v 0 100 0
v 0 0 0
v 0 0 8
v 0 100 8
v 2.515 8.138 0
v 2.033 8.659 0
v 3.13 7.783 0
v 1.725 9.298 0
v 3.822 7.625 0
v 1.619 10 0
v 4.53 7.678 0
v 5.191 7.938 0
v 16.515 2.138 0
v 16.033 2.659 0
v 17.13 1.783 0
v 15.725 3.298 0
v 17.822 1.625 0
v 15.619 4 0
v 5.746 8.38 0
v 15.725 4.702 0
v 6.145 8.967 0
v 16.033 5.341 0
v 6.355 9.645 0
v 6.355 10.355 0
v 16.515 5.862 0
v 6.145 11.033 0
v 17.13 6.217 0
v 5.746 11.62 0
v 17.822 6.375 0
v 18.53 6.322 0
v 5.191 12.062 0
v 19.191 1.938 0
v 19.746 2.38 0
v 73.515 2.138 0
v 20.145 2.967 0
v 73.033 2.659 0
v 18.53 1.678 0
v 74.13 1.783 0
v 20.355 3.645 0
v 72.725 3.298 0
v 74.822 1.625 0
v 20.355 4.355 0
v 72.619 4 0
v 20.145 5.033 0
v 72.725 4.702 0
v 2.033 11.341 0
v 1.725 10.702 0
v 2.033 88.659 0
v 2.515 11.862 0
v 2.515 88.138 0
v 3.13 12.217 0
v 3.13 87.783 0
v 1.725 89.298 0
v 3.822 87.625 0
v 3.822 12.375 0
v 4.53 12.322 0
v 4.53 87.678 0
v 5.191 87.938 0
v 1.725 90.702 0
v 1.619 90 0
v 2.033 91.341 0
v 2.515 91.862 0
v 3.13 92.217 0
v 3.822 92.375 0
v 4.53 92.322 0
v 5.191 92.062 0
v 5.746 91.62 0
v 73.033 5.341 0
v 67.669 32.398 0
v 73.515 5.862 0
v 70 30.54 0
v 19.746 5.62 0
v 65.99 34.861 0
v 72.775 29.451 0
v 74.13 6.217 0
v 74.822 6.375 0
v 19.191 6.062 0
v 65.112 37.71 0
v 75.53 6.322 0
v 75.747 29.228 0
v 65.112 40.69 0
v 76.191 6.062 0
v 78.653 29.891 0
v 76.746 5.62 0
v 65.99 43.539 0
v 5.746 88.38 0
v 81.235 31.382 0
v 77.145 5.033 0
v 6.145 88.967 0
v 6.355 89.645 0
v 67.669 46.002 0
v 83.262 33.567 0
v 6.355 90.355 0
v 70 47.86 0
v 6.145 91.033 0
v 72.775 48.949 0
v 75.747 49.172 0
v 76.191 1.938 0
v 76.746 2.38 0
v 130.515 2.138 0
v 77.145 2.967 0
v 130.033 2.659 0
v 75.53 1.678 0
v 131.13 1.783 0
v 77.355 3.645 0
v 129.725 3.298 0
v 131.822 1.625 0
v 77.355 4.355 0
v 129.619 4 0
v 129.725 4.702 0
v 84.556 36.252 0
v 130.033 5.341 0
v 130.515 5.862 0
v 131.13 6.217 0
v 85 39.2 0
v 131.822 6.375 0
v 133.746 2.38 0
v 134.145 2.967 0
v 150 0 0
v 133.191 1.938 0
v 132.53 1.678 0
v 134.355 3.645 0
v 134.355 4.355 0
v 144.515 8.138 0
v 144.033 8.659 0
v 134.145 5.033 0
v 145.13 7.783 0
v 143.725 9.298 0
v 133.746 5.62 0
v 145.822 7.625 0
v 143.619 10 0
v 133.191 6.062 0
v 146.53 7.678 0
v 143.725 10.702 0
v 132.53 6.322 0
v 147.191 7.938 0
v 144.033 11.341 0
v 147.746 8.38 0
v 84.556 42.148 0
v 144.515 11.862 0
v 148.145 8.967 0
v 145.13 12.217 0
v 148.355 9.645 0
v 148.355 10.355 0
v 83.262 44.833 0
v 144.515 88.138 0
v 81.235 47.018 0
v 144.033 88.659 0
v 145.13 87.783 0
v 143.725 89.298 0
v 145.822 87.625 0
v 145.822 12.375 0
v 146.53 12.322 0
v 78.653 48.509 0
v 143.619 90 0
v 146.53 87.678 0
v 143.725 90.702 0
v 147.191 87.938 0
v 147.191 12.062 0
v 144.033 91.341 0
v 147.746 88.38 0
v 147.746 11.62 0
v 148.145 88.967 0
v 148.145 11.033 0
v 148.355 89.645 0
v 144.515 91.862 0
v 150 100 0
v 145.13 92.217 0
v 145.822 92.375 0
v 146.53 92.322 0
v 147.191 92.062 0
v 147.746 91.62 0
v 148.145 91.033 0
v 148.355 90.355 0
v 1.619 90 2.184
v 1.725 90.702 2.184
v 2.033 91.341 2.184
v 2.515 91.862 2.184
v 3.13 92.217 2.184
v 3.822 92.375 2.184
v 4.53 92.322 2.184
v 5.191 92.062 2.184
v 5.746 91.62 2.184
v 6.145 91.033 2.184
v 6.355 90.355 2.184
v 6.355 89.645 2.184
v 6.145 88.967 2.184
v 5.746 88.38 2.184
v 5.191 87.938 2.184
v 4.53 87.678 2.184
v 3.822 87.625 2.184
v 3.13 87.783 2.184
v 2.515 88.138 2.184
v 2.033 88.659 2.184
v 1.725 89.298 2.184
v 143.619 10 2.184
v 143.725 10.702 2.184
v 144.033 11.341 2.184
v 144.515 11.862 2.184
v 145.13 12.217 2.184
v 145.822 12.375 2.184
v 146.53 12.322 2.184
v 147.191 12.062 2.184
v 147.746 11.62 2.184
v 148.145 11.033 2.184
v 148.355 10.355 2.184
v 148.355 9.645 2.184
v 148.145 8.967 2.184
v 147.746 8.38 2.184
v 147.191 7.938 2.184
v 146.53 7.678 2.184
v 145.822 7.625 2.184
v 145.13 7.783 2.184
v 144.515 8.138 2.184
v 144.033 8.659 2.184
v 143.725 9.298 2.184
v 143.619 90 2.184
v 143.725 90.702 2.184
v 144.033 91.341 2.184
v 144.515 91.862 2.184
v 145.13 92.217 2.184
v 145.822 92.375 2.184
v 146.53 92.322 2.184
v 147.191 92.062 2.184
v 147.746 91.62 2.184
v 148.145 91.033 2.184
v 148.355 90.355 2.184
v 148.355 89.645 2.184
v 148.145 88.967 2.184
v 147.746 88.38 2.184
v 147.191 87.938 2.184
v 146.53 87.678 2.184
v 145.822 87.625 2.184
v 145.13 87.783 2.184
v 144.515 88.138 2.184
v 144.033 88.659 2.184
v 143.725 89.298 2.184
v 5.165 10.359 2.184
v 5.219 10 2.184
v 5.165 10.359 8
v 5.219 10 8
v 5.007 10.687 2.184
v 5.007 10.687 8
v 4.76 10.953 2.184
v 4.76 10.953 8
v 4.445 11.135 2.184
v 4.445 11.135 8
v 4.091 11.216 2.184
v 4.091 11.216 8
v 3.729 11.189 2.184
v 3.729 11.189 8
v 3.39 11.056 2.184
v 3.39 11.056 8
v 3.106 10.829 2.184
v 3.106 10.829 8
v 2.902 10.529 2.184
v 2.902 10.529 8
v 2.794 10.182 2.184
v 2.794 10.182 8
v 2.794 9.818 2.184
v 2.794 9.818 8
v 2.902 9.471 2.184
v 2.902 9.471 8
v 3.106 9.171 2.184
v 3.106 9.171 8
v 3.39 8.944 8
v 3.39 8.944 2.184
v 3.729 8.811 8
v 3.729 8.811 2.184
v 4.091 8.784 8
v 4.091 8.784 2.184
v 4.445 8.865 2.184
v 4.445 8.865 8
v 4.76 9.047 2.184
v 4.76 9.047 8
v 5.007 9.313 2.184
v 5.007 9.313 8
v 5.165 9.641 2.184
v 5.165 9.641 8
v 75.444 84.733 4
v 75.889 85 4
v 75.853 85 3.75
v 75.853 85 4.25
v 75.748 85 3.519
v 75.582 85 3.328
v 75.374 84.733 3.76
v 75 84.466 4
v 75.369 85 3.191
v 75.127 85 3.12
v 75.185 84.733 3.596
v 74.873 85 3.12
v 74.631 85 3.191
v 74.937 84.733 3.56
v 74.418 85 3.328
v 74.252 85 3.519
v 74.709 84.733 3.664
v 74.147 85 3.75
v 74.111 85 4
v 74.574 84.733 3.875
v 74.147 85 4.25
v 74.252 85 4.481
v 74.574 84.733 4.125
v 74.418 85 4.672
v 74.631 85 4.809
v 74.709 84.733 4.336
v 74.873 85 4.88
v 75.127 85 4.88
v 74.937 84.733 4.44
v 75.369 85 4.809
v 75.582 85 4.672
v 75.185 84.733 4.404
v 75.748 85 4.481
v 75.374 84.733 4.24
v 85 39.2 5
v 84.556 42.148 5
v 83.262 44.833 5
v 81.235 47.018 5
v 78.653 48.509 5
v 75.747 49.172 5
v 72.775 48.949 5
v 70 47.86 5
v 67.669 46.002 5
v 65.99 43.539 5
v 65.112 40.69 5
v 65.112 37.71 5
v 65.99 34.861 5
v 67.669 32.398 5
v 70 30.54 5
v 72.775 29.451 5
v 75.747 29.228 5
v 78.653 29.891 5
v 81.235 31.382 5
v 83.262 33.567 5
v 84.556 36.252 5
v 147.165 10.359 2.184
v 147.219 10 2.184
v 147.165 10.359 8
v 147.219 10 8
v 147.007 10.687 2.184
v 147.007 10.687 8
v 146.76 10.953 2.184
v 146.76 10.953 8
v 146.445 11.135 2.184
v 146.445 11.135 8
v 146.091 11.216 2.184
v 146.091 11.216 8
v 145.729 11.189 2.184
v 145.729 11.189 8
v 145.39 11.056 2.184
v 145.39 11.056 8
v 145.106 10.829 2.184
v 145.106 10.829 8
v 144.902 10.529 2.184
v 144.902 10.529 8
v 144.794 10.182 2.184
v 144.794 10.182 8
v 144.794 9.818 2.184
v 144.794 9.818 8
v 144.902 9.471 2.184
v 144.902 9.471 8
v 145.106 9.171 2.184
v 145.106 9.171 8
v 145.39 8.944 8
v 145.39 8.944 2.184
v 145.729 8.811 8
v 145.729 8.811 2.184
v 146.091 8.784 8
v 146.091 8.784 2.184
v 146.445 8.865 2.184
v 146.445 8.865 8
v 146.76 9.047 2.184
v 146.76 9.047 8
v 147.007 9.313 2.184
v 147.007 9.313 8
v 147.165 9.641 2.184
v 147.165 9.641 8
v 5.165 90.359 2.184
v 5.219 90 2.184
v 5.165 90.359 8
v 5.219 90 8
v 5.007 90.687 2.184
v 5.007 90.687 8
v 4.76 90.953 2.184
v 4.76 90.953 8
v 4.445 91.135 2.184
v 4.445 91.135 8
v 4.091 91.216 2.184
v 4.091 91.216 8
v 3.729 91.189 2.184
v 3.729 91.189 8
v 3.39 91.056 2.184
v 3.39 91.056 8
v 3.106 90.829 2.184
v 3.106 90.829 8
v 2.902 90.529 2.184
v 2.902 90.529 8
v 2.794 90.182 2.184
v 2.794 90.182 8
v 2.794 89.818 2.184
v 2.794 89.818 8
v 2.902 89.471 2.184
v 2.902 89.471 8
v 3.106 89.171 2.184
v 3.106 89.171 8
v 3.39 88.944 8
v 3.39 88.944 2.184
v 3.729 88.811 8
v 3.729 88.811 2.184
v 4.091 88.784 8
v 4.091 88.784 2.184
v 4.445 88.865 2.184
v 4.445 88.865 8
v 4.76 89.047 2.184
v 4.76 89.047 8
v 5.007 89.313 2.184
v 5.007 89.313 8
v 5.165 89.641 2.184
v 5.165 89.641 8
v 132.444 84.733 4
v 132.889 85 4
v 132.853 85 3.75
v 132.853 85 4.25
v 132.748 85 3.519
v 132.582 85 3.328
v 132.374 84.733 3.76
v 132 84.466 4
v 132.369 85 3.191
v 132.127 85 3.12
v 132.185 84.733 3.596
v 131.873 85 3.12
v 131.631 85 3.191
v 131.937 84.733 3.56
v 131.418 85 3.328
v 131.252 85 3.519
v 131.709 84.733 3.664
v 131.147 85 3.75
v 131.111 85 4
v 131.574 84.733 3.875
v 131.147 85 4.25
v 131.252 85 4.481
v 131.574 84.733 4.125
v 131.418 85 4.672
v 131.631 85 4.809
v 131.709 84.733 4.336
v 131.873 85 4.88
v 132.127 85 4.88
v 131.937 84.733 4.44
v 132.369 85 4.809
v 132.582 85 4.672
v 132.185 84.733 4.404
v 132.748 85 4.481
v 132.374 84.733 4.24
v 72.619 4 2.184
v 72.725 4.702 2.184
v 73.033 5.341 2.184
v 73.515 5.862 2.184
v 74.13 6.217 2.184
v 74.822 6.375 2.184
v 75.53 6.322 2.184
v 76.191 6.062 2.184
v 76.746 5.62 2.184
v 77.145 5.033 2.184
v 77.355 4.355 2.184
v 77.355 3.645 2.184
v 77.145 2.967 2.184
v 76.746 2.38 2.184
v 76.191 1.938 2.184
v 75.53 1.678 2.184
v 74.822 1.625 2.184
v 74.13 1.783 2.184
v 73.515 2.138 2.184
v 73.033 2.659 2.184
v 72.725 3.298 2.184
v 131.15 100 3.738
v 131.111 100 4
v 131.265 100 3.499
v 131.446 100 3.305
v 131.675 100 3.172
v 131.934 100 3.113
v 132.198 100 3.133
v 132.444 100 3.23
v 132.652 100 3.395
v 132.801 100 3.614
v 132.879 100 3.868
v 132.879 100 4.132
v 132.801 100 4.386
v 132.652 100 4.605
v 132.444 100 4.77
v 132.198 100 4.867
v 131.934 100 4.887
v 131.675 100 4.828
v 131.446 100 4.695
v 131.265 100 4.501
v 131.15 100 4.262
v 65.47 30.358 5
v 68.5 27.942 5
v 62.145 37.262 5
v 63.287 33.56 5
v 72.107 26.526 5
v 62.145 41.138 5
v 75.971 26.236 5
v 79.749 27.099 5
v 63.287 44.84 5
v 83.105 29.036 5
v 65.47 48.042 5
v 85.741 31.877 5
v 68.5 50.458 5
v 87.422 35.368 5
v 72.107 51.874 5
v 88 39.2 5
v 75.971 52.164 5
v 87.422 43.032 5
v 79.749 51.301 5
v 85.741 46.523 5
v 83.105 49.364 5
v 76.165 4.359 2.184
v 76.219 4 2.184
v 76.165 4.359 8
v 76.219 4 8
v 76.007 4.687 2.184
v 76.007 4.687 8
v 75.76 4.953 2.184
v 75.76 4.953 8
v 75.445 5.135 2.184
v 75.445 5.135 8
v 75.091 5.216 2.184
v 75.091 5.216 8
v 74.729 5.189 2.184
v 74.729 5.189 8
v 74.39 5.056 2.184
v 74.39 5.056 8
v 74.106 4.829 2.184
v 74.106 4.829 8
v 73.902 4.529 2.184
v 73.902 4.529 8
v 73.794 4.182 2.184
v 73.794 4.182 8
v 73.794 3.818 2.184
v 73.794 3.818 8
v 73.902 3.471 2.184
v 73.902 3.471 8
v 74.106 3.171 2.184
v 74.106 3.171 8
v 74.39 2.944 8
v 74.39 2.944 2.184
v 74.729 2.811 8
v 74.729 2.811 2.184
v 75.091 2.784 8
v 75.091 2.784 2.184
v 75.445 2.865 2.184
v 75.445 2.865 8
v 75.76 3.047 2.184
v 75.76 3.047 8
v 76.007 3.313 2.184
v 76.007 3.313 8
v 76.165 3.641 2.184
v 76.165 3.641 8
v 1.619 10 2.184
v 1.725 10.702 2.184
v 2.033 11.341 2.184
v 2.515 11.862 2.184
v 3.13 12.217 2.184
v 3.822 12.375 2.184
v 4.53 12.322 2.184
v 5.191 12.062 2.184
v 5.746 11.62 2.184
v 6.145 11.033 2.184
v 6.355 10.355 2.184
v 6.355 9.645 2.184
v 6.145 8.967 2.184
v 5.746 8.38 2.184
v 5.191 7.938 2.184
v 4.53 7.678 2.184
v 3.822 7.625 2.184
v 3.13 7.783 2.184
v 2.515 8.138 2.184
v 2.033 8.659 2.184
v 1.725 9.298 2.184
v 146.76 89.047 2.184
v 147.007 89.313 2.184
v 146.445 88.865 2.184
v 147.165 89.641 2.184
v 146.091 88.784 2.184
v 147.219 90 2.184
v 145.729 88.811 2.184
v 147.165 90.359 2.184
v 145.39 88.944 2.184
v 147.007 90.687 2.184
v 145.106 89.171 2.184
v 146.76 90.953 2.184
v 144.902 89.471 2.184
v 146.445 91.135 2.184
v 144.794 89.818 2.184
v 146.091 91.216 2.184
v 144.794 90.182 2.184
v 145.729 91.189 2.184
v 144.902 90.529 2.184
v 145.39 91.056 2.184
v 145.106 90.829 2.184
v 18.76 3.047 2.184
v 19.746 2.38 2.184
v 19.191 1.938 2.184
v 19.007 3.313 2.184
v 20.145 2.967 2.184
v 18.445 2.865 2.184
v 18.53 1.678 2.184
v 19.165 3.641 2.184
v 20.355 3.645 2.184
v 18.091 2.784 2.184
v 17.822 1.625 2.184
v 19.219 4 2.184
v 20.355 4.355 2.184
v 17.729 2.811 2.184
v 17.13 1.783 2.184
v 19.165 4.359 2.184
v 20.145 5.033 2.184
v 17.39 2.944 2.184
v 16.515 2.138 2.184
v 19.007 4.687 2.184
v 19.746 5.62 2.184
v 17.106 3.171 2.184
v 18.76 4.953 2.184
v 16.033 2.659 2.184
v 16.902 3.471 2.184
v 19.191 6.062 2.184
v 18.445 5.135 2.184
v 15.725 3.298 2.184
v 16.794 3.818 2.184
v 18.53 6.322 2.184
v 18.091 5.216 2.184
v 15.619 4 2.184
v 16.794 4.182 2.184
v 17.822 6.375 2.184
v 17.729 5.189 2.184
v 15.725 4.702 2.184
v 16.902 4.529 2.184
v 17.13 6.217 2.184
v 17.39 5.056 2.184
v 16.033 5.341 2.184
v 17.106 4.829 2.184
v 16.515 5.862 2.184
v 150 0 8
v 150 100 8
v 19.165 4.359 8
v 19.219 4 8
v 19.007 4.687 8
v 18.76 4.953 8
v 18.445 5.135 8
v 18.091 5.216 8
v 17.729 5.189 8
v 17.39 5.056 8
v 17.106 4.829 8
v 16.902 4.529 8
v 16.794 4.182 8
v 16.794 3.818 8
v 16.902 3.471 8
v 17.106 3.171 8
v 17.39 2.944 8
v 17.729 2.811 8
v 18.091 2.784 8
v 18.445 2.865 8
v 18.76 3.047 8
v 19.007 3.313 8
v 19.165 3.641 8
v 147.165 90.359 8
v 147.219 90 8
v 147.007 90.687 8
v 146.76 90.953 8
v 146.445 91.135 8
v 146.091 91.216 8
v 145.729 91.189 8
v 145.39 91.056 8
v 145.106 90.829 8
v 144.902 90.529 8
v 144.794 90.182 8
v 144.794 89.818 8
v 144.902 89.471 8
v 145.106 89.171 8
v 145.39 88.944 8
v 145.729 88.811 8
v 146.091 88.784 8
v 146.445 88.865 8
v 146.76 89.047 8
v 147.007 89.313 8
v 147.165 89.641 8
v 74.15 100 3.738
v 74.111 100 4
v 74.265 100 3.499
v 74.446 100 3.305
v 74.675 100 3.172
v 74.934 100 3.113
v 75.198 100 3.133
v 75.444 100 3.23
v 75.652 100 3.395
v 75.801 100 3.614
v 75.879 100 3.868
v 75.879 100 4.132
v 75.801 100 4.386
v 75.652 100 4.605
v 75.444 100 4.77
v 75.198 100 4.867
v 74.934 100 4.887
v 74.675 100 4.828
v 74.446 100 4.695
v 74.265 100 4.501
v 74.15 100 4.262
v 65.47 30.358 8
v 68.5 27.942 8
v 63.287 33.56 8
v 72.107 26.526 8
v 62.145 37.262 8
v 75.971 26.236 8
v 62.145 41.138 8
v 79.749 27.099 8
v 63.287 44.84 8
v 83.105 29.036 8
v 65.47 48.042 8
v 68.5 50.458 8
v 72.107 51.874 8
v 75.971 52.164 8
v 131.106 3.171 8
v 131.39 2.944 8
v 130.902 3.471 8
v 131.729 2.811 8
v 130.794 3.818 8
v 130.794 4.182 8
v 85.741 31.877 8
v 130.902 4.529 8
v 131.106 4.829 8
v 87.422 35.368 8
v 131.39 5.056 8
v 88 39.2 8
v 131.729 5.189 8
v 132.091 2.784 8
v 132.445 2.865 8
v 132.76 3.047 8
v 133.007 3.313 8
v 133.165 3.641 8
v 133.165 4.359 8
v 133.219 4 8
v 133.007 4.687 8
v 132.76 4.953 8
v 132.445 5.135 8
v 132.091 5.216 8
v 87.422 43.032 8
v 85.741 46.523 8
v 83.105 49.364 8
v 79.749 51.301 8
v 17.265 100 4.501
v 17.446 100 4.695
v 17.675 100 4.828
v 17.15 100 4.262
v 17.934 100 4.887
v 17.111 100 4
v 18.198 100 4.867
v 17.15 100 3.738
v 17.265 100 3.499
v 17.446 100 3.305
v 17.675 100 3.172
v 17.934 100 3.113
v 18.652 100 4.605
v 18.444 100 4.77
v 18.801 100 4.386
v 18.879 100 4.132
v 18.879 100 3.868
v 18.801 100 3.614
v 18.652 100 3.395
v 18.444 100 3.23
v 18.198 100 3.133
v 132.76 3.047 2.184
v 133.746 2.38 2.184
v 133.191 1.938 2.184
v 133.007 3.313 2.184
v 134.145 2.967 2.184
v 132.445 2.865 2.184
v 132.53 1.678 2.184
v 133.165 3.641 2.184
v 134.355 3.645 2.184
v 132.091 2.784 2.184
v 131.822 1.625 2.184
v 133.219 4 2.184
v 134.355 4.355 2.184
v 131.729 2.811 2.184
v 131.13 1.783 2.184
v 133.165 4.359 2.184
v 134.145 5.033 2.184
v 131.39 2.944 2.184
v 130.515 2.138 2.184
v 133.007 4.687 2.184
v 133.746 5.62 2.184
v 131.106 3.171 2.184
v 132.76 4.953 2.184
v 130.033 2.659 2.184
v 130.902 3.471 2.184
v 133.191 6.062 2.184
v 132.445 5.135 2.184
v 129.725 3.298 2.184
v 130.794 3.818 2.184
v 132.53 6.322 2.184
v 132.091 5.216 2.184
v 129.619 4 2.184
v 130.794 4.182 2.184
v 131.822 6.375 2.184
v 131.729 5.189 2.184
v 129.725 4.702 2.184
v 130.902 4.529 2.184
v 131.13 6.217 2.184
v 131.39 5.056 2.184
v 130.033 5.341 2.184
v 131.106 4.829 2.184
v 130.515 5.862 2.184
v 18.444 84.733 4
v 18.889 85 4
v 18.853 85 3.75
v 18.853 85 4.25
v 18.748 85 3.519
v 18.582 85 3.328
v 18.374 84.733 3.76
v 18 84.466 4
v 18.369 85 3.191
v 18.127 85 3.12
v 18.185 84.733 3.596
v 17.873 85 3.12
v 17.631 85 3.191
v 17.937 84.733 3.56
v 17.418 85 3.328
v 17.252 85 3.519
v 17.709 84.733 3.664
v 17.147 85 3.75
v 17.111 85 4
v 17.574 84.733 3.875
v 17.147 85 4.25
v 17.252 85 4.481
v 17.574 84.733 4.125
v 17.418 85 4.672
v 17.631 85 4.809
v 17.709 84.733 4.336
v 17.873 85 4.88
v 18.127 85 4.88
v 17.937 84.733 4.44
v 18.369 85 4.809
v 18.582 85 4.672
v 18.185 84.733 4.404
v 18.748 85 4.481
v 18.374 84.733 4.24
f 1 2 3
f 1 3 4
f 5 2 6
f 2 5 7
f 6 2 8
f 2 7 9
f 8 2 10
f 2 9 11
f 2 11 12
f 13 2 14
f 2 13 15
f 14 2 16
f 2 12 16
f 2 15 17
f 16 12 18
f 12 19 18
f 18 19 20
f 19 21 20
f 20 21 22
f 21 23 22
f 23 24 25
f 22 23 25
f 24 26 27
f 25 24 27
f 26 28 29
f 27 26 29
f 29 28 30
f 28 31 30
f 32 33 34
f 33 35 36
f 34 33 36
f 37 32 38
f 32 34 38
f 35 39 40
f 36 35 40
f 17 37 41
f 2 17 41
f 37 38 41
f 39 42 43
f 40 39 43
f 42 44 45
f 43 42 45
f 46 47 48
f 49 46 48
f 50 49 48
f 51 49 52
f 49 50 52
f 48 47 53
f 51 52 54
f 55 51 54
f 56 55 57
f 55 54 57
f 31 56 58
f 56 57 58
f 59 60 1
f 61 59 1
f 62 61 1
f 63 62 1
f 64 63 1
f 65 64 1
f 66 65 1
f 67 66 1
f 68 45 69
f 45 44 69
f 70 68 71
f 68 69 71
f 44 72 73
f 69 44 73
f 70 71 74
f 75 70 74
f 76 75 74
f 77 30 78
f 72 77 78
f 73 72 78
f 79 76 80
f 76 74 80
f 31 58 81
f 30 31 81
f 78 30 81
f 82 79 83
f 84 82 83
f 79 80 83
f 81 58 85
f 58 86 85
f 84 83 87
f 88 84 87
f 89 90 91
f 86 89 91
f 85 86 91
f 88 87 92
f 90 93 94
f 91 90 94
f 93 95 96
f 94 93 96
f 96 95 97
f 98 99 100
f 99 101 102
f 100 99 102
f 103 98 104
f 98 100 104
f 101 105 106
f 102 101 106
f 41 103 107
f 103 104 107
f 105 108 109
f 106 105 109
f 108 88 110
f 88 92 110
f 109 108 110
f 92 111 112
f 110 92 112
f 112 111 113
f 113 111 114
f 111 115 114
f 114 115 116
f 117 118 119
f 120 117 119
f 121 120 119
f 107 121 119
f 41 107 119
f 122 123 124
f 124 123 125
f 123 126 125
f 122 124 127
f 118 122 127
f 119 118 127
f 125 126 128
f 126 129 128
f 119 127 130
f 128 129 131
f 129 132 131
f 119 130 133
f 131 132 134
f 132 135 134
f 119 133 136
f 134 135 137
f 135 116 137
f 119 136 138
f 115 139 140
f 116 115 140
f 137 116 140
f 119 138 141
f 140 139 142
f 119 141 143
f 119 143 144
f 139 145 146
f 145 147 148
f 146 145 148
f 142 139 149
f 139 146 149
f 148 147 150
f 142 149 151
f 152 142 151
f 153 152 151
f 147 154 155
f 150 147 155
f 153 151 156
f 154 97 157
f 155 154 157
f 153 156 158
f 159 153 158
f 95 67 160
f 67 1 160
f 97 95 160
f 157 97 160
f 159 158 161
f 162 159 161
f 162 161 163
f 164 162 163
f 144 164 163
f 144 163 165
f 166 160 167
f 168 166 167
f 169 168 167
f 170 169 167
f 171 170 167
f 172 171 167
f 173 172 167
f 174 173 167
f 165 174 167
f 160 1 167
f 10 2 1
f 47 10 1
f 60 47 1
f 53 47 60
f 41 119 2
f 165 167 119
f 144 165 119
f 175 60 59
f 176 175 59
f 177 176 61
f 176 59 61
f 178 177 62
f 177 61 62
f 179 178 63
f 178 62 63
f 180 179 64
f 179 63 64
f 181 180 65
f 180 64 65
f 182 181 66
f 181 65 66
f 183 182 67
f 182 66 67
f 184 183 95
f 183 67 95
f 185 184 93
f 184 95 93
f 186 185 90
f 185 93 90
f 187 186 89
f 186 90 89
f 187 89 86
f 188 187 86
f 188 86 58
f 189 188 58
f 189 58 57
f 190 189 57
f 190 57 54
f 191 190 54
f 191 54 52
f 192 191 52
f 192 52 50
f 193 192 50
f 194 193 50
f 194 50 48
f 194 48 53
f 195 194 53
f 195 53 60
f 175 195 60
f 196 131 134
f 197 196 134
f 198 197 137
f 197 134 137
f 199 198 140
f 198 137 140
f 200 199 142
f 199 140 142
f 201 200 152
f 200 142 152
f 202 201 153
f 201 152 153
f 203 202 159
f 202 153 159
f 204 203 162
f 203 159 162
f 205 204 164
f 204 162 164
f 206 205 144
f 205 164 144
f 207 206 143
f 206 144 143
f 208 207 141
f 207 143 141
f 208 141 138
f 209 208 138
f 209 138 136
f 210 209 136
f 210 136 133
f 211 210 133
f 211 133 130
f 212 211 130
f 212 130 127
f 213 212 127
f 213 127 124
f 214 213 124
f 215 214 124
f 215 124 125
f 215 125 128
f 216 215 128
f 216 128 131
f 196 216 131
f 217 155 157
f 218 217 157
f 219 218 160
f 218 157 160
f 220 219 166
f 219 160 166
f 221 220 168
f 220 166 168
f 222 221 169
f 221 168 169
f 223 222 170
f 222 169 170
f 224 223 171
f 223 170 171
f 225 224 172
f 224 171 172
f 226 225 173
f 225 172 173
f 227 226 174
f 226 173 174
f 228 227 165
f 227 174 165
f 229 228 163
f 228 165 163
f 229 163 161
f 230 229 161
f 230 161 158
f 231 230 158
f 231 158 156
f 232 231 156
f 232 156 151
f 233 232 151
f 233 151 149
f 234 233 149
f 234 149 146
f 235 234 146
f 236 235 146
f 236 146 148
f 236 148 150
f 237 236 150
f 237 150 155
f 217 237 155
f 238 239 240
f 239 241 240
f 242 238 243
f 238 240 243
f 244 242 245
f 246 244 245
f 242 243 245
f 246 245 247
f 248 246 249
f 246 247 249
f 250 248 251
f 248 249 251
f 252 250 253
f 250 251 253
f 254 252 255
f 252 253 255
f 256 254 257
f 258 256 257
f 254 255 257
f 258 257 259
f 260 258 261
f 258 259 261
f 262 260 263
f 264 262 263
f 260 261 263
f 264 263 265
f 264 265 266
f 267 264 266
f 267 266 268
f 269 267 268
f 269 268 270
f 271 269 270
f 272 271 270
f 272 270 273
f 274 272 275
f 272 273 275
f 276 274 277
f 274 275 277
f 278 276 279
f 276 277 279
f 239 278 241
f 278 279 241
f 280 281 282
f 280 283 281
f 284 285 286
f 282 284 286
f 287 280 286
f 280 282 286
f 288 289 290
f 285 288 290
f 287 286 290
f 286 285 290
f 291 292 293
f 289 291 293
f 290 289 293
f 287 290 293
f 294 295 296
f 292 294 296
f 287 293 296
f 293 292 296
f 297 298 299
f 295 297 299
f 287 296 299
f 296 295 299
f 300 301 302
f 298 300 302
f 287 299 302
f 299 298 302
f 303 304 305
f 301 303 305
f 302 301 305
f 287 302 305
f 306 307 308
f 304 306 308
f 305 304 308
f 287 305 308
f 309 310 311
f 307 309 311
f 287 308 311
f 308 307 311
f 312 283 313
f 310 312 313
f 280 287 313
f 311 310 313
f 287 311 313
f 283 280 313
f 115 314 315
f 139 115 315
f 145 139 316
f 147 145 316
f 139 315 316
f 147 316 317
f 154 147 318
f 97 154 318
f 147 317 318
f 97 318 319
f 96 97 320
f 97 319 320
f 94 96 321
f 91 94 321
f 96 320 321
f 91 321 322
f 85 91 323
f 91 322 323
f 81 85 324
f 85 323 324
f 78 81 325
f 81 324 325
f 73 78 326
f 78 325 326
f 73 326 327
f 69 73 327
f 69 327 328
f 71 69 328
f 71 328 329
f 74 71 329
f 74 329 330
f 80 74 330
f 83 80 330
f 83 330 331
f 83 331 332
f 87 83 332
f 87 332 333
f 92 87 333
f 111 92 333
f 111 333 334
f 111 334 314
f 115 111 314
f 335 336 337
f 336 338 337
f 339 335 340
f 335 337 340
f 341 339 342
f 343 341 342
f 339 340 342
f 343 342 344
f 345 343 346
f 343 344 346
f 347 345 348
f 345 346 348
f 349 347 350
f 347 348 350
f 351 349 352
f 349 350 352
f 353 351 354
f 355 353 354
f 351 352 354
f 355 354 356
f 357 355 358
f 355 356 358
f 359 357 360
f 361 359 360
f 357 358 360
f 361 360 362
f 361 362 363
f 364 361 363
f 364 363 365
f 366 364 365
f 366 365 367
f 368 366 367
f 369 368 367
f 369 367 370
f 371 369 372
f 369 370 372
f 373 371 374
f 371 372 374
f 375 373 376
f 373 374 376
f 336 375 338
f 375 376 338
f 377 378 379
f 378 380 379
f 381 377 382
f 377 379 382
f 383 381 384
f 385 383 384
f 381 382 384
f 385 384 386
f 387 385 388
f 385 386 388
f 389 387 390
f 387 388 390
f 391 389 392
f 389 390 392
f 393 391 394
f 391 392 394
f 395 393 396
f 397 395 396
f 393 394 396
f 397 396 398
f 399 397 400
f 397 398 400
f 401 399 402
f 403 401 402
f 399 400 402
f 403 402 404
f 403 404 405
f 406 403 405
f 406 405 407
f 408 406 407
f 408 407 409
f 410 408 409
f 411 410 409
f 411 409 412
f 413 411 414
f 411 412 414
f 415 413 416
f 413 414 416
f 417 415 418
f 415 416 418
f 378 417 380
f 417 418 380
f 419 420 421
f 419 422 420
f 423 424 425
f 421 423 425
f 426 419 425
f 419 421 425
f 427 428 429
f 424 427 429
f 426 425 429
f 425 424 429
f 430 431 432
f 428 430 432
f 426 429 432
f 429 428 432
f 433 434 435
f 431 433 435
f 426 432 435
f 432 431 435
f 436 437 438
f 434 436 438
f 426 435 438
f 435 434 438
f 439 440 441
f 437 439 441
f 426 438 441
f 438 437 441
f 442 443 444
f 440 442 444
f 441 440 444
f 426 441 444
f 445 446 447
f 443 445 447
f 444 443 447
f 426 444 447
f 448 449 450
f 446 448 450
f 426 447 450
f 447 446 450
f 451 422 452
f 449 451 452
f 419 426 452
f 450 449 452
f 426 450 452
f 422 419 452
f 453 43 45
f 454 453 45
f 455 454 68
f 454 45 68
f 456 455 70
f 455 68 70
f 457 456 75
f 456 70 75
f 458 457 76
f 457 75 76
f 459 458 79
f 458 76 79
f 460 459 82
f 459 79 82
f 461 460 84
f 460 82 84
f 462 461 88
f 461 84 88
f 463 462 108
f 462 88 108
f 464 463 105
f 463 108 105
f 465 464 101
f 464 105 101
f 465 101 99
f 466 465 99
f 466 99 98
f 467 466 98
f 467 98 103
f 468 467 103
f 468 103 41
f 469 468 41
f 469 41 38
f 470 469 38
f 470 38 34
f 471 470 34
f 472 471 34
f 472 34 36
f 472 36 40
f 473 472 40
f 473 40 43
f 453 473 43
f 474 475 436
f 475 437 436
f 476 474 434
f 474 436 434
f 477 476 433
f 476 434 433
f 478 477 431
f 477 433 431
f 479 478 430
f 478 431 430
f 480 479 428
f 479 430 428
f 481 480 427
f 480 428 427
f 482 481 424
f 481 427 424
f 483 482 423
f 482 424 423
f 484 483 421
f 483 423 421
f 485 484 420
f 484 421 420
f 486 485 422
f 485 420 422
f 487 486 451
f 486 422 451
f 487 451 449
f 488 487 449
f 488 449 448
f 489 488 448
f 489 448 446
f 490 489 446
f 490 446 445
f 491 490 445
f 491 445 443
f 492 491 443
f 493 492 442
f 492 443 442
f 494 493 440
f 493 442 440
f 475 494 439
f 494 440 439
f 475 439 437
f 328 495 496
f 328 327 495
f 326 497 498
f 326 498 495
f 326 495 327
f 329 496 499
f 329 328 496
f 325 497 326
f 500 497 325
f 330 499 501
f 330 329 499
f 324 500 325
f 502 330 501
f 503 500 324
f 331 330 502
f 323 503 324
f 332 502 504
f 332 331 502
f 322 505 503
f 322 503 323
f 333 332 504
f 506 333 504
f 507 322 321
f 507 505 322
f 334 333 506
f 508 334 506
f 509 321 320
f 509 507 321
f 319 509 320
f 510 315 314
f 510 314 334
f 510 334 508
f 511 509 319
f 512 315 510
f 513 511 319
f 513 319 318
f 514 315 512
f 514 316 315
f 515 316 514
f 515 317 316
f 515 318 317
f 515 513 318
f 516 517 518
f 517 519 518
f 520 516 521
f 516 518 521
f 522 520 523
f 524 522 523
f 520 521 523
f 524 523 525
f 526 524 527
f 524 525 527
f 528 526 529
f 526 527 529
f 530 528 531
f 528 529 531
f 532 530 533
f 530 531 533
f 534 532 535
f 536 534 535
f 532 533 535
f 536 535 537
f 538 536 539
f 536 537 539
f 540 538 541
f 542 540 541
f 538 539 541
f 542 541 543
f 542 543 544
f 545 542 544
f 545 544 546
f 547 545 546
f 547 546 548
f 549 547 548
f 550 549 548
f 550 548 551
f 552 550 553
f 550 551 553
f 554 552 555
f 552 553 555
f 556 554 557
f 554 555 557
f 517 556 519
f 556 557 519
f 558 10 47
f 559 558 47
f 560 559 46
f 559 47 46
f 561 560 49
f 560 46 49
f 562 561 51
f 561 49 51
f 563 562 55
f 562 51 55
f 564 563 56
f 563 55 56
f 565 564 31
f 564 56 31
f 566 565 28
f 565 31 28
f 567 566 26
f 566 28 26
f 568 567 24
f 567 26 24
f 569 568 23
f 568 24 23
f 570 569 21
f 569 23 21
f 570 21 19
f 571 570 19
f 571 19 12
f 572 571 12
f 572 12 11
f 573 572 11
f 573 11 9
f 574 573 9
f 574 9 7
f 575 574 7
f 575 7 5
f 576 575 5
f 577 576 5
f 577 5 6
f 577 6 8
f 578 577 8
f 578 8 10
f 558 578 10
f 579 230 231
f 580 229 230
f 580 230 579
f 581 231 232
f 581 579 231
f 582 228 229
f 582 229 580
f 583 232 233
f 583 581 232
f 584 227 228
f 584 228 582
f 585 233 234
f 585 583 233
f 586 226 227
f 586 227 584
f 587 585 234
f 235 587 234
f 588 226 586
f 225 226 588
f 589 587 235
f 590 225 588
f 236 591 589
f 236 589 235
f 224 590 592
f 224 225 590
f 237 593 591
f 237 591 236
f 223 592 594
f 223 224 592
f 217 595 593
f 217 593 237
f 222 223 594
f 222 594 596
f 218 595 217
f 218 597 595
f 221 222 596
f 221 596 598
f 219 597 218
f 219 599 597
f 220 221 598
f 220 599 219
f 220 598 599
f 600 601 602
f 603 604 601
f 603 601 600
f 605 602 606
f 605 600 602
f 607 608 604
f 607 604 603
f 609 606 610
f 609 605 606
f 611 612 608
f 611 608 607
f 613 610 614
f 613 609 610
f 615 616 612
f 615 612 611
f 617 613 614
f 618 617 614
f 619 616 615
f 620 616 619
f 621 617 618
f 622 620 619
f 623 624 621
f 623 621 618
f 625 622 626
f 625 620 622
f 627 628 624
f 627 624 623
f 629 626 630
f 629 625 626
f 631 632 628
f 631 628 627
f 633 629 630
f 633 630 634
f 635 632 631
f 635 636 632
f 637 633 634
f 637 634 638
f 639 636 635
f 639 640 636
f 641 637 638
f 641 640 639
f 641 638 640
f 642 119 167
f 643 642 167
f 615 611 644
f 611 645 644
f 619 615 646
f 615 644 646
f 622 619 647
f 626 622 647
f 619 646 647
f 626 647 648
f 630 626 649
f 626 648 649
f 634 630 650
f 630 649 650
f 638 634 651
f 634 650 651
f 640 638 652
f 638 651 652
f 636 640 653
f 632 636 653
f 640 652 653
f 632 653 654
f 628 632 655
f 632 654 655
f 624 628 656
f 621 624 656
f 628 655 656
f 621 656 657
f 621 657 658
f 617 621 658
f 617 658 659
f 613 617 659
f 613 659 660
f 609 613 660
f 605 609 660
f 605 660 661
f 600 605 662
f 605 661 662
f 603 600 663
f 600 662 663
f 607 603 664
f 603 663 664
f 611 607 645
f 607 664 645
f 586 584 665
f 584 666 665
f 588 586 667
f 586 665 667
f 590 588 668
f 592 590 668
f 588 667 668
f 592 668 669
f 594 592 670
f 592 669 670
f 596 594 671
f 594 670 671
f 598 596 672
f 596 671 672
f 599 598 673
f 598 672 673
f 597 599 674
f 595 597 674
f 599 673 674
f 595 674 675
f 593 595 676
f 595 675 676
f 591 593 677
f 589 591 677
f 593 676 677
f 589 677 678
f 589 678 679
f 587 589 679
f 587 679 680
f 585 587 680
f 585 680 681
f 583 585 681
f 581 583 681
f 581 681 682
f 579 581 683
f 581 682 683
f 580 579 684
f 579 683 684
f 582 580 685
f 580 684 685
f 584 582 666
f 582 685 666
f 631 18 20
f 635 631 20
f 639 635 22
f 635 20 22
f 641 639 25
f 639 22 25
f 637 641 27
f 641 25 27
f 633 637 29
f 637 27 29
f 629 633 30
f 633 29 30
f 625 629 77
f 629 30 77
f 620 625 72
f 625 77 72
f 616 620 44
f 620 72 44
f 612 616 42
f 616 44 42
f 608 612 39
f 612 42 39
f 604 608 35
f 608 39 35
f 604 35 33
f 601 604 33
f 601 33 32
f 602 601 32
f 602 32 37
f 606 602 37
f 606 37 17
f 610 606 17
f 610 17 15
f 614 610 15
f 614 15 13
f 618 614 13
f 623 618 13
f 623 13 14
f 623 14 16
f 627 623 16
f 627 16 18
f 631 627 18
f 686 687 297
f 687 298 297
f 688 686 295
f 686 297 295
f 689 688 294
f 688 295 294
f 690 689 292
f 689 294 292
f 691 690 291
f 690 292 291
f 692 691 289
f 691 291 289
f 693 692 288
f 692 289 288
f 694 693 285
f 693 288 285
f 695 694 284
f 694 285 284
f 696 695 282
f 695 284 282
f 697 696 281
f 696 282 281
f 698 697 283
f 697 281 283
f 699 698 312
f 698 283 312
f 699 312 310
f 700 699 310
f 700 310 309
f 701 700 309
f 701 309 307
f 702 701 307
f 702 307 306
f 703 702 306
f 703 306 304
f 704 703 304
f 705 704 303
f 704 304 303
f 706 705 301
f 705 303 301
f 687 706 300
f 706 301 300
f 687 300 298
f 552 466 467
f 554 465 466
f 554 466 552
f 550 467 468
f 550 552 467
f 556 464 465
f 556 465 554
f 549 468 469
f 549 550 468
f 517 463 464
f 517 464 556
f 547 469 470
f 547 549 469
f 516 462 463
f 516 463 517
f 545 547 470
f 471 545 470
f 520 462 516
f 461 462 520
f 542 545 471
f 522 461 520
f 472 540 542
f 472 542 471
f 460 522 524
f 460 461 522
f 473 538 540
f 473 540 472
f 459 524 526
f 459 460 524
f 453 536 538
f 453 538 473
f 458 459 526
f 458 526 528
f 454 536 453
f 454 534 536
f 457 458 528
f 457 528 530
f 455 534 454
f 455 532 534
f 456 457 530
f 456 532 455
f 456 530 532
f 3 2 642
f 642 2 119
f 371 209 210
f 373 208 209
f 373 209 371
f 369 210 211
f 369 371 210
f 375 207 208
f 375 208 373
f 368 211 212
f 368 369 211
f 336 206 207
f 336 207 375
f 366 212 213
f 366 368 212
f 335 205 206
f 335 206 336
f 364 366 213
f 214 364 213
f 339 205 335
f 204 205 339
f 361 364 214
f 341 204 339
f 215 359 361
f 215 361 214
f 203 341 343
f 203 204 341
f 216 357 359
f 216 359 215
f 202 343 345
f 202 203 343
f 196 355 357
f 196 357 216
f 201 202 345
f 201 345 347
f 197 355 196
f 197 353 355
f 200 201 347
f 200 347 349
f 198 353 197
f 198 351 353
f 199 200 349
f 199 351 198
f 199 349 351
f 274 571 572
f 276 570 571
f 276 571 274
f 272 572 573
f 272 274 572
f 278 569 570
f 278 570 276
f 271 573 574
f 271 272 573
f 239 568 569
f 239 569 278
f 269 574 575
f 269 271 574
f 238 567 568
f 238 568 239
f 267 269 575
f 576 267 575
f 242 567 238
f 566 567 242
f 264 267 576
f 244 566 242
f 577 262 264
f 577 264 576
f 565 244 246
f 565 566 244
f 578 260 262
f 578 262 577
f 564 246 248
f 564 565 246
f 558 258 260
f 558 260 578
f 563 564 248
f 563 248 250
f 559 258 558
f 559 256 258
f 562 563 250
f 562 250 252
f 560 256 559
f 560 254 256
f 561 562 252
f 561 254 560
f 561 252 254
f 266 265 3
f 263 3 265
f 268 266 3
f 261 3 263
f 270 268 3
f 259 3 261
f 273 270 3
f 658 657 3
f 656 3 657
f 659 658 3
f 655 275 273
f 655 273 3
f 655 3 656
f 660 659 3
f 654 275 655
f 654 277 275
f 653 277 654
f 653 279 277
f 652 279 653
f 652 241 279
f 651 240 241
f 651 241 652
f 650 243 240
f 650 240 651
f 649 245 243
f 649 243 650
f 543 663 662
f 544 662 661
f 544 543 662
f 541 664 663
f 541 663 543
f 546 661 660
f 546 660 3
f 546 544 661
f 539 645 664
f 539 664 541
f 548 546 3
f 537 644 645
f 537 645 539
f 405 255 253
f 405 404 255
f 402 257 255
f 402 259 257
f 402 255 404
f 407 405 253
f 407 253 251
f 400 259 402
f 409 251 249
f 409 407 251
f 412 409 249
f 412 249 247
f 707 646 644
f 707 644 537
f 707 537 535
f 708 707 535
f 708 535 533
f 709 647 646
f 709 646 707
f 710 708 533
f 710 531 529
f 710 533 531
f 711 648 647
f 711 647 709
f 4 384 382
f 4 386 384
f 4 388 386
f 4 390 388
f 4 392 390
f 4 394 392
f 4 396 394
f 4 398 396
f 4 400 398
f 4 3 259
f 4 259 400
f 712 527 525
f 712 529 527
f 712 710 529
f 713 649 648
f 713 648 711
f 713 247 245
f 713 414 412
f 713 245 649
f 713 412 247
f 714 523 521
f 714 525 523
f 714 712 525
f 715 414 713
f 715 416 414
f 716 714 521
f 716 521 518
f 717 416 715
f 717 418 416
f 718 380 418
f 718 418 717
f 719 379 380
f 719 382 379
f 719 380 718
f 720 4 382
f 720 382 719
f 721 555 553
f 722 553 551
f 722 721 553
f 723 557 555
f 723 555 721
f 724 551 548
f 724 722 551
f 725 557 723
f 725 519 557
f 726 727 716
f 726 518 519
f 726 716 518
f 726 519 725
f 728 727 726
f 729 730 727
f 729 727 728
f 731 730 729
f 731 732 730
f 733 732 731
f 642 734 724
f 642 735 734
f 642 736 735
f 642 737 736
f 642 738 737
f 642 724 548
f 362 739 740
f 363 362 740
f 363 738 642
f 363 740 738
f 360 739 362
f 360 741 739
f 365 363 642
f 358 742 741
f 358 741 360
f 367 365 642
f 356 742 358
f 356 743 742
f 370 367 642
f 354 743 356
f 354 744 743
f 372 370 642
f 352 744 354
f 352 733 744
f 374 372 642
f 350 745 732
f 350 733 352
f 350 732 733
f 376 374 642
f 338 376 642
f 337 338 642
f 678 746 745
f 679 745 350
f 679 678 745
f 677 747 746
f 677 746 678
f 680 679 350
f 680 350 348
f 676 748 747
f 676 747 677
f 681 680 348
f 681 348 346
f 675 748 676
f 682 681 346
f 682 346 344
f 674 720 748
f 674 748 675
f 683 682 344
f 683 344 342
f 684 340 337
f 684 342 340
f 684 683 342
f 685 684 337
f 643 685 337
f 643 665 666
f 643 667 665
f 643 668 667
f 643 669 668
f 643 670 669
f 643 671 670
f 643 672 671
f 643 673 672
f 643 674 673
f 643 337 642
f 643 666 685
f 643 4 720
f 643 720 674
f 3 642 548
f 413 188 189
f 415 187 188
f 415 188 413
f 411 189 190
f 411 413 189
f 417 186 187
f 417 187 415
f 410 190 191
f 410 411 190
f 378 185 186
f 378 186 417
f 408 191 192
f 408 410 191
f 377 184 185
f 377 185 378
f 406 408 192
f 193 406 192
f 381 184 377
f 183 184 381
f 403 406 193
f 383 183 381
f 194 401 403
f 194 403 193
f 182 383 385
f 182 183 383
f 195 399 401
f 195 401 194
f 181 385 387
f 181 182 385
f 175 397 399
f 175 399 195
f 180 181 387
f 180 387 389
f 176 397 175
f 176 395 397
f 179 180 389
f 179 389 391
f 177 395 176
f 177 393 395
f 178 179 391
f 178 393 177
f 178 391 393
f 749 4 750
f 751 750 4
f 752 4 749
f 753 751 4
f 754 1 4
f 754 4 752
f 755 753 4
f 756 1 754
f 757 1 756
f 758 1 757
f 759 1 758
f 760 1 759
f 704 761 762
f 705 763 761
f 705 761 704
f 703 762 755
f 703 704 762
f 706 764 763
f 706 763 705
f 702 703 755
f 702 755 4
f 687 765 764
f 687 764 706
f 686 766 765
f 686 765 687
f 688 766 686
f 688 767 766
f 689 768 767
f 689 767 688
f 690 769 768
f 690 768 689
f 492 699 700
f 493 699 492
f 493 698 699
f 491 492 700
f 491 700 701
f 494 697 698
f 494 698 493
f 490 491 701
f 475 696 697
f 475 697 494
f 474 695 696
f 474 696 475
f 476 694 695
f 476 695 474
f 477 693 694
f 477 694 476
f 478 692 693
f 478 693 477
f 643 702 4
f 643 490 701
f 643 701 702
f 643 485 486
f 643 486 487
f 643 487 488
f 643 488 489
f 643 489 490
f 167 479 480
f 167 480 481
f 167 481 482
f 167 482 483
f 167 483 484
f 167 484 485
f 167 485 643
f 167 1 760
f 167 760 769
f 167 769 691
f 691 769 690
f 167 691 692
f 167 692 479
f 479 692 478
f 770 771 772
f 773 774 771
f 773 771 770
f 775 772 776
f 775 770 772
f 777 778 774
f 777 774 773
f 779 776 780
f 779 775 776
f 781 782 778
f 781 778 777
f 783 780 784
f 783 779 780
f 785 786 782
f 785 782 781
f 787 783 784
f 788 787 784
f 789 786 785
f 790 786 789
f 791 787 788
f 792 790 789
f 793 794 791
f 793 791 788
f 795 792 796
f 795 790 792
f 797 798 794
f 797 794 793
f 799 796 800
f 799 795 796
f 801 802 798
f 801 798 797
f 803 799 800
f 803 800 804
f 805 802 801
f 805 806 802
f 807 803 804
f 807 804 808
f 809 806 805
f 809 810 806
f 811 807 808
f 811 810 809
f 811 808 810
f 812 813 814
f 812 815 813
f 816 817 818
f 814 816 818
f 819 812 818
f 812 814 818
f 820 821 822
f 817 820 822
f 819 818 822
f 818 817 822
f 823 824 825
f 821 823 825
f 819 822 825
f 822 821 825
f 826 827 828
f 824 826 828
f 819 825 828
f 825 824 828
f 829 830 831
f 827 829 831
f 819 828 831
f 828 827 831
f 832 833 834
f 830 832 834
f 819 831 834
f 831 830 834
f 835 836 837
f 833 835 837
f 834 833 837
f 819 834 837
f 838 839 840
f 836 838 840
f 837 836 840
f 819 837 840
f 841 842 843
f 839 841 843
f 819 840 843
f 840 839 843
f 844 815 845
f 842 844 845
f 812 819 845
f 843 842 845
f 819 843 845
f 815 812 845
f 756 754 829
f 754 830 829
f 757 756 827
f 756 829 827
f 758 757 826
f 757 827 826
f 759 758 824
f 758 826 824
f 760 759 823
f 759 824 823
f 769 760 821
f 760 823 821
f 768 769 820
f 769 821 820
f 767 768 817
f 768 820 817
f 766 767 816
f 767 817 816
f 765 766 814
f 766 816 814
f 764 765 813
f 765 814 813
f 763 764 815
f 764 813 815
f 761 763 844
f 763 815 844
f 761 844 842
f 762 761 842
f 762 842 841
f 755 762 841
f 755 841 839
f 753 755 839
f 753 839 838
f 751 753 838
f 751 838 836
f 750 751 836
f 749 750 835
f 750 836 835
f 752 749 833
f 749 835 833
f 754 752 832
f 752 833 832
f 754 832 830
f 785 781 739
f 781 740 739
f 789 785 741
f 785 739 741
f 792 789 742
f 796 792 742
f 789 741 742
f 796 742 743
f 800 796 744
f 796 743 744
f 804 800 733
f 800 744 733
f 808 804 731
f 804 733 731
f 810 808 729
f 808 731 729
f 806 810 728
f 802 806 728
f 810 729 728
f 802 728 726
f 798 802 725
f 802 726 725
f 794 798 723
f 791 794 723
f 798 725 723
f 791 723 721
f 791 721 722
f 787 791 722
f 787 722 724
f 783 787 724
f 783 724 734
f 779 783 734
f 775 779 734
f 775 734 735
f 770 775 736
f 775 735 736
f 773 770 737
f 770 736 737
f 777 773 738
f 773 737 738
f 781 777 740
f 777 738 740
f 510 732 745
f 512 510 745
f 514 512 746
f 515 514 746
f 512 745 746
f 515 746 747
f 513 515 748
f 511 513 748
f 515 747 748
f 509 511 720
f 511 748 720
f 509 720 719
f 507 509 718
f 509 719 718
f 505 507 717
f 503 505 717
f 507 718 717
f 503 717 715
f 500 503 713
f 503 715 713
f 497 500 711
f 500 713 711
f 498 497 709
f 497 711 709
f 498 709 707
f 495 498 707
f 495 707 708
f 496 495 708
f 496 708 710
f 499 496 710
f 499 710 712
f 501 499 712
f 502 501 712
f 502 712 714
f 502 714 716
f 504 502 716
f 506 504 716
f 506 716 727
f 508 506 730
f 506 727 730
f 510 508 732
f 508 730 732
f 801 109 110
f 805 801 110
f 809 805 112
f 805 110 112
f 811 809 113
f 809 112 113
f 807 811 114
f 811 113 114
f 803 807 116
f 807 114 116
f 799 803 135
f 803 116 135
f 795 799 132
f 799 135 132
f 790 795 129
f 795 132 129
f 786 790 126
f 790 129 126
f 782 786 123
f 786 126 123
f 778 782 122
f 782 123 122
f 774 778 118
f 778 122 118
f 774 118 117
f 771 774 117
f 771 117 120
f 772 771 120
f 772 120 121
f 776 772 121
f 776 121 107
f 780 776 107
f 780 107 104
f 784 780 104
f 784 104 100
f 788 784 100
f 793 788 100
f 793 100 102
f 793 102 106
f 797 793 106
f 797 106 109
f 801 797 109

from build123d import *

# Parameters (mm, degrees)
SKETCH1_W                                      = 150
SKETCH1_H                                      = 100
BOSS_EXTRUDE1_DEPTH                            = 8
CBORE_FOR_2_SOCKET_HEAD_CAP_SCREW1_D           = 2.4384
CBORE_FOR_2_SOCKET_HEAD_CAP_SCREW1_CBORE_D     = 4.7625
CBORE_FOR_2_SOCKET_HEAD_CAP_SCREW1_CBORE_DEPTH = 2.1844
SKETCH5_R                                      = 10
CUT_EXTRUDE1_DEPTH                             = 9
SKETCH6_R                                      = 13
CUT_EXTRUDE2_DEPTH                             = 3
F_2_56_TAPPED_HOLE1_D                          = 1.778
F_2_56_TAPPED_HOLE1_DEPTH                      = 15
F_2_56_TAPPED_HOLE1_TIP                        = 0.53416509


with BuildPart() as part:
    # Sketch1 → Boss-Extrude1 (new body)
    with BuildSketch(Plane.XY):
        with Locations((75, 50)):
            Rectangle(SKETCH1_W, SKETCH1_H)
    extrude(amount=BOSS_EXTRUDE1_DEPTH)

    # CBORE for #2 Socket Head Cap Screw1 (through all)
    with Locations(Plane(origin=(0, 0, 0), x_dir=(-1, 0, 0), z_dir=(0, 0, -1))):
        with Locations((-132, 4), (-18, 4), (-4, 90), (-146, 90), (-146, 10), (-4, 10), (-75, 4)):
            CounterBoreHole(CBORE_FOR_2_SOCKET_HEAD_CAP_SCREW1_D / 2, CBORE_FOR_2_SOCKET_HEAD_CAP_SCREW1_CBORE_D / 2, CBORE_FOR_2_SOCKET_HEAD_CAP_SCREW1_CBORE_DEPTH)

    # Sketch5 → Cut-Extrude1 (cut, through all)
    with BuildSketch(Plane.XY.offset(8)):
        with Locations((75, 39.2)):
            Circle(SKETCH5_R)
    extrude(amount=-CUT_EXTRUDE1_DEPTH, mode=Mode.SUBTRACT)

    # Sketch6 → Cut-Extrude2 (cut)
    with BuildSketch(Plane.XY.offset(8)):
        with Locations((75, 39.2)):
            Circle(SKETCH6_R)
    extrude(amount=-CUT_EXTRUDE2_DEPTH, mode=Mode.SUBTRACT)

    # #2-56 Tapped Hole1
    with Locations(Plane(origin=(0, 100, 0), x_dir=(1, 0, 0), z_dir=(0, 1, 0))):
        with Locations((18, -4), (75, -4), (132, -4)):
            Hole(F_2_56_TAPPED_HOLE1_D / 2, depth=F_2_56_TAPPED_HOLE1_DEPTH)
            with Locations((0, 0, -(F_2_56_TAPPED_HOLE1_DEPTH + F_2_56_TAPPED_HOLE1_TIP / 2))):  # 118° drill point
                Cone(0, F_2_56_TAPPED_HOLE1_D / 2, F_2_56_TAPPED_HOLE1_TIP, mode=Mode.SUBTRACT)


solid = part.part
